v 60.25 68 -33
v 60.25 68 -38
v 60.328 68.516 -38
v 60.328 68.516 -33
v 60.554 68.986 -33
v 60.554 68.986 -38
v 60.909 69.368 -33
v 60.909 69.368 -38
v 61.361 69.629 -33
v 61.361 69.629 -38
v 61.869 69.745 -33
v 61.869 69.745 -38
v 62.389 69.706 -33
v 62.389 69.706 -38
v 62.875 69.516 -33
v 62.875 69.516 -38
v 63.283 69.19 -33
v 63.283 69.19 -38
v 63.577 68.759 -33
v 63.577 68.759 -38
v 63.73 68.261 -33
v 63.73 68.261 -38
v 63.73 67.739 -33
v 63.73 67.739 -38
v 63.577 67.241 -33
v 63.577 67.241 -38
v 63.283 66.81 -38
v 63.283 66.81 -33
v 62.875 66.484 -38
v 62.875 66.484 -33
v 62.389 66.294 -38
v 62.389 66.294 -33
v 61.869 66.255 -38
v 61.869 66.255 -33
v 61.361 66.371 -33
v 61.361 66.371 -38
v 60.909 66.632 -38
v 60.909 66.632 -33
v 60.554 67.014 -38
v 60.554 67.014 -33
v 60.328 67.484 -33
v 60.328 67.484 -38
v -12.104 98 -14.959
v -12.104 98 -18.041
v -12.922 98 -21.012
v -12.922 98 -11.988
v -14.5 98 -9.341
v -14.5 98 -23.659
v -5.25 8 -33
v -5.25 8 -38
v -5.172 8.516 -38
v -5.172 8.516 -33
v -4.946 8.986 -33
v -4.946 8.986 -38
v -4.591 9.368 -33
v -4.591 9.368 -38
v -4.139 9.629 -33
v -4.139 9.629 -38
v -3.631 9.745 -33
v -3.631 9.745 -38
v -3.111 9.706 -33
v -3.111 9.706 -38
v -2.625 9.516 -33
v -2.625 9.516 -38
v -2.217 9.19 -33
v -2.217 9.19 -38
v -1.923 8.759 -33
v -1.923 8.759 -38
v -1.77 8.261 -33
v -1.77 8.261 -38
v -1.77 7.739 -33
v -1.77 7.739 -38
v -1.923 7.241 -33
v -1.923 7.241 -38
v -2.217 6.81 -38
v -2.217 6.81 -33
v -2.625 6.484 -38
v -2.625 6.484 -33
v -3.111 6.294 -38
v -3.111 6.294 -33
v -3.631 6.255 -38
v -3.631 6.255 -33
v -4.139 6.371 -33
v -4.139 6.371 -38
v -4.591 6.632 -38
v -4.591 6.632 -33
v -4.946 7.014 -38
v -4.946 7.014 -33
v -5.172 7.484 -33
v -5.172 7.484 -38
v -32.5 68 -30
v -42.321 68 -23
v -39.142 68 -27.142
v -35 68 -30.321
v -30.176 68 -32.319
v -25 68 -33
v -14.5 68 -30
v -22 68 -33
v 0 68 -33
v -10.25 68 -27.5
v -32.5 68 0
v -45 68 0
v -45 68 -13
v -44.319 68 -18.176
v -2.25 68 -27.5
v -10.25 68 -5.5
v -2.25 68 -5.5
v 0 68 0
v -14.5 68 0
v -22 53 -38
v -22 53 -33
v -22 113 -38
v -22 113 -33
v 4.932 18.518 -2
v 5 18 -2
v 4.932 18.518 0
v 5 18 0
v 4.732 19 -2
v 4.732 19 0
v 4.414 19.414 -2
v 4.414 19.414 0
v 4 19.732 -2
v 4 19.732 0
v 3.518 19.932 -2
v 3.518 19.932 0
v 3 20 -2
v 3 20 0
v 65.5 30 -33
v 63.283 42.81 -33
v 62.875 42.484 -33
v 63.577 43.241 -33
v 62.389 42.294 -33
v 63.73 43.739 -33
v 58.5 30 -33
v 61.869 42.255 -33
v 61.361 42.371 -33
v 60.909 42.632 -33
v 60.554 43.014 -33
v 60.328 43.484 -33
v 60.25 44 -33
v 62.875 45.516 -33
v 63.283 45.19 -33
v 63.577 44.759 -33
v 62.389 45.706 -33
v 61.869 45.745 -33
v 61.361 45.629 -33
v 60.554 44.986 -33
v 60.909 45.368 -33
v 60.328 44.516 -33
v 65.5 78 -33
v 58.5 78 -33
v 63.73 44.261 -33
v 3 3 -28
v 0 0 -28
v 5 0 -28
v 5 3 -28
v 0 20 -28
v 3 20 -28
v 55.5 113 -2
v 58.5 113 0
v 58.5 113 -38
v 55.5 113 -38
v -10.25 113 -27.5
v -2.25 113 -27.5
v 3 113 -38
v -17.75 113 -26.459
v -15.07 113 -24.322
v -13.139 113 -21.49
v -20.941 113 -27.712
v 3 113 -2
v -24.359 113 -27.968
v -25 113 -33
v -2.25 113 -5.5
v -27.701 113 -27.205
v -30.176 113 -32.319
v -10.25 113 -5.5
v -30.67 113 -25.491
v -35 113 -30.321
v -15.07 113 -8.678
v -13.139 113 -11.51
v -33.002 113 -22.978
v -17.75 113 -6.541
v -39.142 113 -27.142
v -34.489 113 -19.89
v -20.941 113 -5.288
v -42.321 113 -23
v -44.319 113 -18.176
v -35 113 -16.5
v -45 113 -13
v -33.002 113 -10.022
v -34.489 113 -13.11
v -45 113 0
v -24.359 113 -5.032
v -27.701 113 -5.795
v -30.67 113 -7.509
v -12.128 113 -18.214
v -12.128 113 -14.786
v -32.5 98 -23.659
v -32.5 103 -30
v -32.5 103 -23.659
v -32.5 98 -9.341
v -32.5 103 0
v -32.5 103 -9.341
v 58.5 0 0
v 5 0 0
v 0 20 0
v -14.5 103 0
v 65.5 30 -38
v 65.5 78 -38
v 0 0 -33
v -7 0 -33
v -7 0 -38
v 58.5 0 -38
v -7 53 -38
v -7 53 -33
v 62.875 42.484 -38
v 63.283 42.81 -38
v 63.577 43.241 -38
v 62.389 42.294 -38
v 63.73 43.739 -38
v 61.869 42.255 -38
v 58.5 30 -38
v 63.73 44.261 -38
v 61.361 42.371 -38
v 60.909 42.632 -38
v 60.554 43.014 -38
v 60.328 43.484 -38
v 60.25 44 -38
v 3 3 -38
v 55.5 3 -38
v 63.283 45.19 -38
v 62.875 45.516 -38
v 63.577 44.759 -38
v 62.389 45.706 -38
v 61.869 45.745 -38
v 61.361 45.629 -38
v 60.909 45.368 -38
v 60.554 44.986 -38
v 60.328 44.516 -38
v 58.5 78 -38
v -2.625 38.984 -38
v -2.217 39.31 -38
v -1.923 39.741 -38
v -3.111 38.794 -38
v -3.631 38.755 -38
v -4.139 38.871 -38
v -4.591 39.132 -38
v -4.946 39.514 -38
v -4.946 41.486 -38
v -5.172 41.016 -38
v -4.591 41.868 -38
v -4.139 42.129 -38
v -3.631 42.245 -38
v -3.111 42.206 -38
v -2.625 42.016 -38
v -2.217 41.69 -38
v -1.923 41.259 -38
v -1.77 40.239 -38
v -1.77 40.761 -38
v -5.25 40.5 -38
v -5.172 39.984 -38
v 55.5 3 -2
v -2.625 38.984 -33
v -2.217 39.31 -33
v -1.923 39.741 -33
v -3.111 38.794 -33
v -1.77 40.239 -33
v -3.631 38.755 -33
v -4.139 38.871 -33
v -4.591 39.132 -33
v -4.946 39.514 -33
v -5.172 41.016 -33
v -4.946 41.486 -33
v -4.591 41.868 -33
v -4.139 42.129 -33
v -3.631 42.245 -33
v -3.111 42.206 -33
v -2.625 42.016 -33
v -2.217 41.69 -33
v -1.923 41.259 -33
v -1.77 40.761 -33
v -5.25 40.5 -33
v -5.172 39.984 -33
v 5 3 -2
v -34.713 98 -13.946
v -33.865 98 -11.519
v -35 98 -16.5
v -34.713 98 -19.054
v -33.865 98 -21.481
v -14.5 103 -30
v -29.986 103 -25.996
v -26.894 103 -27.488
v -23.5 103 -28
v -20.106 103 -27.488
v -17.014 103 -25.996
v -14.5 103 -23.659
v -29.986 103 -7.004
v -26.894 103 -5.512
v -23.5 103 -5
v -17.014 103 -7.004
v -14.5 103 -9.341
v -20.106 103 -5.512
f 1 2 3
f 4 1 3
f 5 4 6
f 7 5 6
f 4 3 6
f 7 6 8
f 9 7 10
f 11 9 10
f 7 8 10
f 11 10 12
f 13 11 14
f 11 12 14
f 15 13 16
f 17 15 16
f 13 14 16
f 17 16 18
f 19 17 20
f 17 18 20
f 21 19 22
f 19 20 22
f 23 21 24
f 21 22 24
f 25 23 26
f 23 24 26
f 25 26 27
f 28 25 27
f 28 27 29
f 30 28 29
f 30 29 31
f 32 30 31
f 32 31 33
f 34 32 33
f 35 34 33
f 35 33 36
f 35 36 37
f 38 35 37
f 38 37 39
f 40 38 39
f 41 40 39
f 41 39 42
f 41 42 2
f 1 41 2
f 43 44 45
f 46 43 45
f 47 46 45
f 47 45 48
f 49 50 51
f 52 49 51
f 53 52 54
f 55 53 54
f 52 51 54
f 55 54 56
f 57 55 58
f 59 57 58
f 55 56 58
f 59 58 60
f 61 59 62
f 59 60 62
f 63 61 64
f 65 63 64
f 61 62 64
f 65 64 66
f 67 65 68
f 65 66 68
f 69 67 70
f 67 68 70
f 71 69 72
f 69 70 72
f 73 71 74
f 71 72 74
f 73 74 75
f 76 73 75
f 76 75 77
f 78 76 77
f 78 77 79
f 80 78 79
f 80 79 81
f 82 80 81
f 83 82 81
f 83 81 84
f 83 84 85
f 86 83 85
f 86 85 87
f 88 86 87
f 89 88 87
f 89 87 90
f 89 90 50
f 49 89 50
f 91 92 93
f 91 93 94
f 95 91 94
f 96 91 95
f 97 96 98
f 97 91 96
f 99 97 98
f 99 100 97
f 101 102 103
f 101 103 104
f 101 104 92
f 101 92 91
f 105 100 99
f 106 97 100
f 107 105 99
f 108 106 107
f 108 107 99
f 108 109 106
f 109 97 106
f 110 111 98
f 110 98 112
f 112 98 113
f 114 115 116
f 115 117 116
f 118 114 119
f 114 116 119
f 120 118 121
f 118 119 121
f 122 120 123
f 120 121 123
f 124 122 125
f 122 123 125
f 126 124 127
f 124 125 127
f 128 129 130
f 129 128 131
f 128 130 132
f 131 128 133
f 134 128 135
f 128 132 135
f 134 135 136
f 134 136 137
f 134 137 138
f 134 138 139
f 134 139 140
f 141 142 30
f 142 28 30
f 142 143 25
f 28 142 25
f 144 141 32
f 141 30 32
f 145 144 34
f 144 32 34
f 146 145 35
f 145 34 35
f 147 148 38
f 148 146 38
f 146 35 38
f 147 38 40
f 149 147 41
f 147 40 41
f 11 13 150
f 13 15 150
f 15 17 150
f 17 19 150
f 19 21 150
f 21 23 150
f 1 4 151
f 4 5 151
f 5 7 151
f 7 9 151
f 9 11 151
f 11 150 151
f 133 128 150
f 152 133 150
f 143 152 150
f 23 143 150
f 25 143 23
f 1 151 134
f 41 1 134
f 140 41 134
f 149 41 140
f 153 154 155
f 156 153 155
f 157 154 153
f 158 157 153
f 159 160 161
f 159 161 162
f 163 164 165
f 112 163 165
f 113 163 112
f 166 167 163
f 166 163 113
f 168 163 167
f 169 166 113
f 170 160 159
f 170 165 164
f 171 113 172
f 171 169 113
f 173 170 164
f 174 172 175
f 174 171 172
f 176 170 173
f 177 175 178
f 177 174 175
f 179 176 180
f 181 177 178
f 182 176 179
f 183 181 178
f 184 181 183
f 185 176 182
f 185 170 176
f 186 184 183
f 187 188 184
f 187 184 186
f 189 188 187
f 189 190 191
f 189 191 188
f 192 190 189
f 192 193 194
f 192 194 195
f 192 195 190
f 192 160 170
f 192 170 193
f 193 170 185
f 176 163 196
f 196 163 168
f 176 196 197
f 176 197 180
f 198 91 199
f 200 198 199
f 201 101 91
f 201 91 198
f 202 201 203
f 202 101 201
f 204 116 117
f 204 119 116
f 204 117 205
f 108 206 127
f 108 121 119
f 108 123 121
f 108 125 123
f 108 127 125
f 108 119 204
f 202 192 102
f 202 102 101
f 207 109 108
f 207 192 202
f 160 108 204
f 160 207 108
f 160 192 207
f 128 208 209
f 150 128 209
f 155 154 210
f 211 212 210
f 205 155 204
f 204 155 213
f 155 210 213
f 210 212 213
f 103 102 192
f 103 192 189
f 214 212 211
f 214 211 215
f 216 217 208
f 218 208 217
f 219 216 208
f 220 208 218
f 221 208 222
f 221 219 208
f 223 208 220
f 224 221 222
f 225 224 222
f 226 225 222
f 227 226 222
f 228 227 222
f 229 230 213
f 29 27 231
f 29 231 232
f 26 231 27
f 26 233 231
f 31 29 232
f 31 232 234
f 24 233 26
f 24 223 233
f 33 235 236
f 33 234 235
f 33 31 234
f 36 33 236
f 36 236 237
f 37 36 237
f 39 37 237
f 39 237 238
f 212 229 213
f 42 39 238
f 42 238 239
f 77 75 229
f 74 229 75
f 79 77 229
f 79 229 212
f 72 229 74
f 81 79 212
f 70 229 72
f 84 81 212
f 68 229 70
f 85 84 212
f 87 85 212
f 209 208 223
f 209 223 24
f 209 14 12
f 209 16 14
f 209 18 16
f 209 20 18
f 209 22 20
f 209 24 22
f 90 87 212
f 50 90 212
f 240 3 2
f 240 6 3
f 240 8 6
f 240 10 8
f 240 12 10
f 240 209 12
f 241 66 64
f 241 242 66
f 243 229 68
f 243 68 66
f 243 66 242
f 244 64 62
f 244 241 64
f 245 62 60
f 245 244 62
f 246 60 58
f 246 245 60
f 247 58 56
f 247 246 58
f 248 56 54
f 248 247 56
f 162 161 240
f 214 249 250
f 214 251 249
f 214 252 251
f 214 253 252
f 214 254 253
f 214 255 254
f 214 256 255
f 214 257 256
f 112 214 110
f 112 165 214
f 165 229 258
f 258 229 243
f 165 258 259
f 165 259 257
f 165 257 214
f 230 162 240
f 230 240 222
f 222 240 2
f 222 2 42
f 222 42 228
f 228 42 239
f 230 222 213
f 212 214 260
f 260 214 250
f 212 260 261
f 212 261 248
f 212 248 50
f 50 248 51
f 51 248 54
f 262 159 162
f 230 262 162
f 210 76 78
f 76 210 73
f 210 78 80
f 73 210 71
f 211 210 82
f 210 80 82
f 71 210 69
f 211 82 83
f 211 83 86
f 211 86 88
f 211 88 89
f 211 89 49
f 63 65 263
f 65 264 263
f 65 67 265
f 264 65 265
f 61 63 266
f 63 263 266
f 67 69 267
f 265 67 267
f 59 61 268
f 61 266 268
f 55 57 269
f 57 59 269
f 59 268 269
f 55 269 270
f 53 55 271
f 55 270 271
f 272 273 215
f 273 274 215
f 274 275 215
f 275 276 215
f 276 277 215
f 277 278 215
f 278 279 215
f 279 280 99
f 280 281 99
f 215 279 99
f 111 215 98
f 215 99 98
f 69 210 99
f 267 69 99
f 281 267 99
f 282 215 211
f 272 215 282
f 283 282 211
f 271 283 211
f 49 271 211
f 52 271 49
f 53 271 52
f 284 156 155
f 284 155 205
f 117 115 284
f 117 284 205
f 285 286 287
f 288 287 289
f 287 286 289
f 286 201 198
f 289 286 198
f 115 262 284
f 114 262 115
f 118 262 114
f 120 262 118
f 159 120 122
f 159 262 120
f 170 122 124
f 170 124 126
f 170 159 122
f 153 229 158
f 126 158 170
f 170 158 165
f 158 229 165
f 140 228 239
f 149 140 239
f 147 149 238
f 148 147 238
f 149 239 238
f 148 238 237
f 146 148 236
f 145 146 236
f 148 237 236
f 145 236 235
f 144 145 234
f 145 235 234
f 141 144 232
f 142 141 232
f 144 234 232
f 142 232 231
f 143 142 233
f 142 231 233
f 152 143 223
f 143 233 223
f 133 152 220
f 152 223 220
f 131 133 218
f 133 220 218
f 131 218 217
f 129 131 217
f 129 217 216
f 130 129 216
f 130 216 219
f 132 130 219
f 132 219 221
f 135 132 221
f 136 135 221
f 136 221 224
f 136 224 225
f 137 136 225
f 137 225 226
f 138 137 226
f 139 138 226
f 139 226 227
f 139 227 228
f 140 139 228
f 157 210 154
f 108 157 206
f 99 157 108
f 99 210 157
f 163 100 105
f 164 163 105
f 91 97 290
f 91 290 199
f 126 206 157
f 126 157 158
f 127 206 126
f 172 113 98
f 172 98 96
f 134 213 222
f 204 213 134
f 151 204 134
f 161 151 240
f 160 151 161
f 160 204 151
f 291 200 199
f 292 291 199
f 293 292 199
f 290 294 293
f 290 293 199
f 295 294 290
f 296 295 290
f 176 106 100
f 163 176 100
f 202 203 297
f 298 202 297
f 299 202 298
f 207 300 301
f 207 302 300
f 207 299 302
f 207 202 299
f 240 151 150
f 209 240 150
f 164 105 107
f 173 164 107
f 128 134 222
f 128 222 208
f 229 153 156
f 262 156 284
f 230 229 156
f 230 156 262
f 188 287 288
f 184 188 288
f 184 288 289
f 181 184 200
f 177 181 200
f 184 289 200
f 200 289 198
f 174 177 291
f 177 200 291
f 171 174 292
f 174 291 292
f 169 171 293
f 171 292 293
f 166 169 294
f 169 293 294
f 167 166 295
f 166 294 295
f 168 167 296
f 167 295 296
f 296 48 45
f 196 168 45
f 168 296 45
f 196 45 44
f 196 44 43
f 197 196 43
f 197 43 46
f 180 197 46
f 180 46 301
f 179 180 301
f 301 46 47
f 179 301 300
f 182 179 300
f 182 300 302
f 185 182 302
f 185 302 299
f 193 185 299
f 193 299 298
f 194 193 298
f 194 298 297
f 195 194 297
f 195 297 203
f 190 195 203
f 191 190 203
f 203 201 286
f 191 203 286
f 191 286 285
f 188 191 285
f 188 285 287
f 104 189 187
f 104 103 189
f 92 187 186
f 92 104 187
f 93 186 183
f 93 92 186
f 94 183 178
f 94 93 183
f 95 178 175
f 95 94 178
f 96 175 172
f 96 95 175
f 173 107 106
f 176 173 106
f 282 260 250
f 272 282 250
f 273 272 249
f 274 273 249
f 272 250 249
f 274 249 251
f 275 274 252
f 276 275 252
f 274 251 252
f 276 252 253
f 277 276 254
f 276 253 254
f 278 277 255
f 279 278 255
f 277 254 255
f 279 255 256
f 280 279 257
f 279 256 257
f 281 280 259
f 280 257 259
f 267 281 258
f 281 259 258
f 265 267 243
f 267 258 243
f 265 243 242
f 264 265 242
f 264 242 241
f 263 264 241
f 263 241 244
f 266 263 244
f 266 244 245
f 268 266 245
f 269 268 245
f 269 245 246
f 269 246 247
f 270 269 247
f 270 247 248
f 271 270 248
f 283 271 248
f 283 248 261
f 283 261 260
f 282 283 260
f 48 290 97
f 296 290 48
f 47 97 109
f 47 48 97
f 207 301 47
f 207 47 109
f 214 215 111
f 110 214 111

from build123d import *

# Parameters (mm, degrees)
SKETCH_1_W          = 58.5
SKETCH_1_H          = 42
EXTRUDE_1_DEPTH     = 123
CUT_EXTRUDE_1_DEPTH = 120
SKETCH_3_W          = 58.5
SKETCH_3_H          = 123
CUT_EXTRUDE_2_DEPTH = 4
SKETCH_4_W          = 52.5
SKETCH_4_H          = 120
CUT_EXTRUDE_3_DEPTH = 1
SKETCH_5_W          = 58.5
SKETCH_5_H          = 38
CUT_EXTRUDE_4_DEPTH = 10
SKETCH_6_W          = 7
SKETCH_6_H          = 113
EXTRUDE_2_DEPTH     = 5
SKETCH_10_W         = 3
SKETCH_10_H         = 20
CUT_EXTRUDE_5_DEPTH = 33
HOLE_WIZARD_2_D     = 3.5
SKETCH_13_W         = 7
SKETCH_13_H         = 113
EXTRUDE_3_DEPTH     = 5
HOLE_WIZARD_3_D     = 3.5
SKETCH_17_W         = 7
SKETCH_17_H         = 35
SKETCH_17_H_2       = 30
CUT_EXTRUDE_6_DEPTH = 5
SKETCH_18_W         = 3
SKETCH_18_H         = 20
EXTRUDE_4_DEPTH     = 5
SKETCH_19_W         = 28
SKETCH_19_H         = 20
CUT_EXTRUDE_7_DEPTH = 2
FILLET_3_R          = 2
SKETCH_21_W         = 33
SKETCH_21_H         = 30
EXTRUDE_6_DEPTH     = 30
SKETCH_22_W         = 15
SKETCH_22_H         = 33
EXTRUDE_7_DEPTH     = 30
SKETCH_24_W         = 18
SKETCH_24_H         = 20
CUT_EXTRUDE_8_DEPTH = 30
HOLE_WIZARD_4_D     = 23
HOLE_WIZARD_4_DEPTH = 15
SKETCH_27_W         = 15
SKETCH_27_H         = 60
EXTRUDE_8_DEPTH     = 5
SKETCH_28_W         = 45
SKETCH_28_H         = 3
EXTRUDE_9_DEPTH     = 15
SKETCH_29_W         = 14.5
SKETCH_29_H         = 30
SKETCH_29_W_2       = 12.5
EXTRUDE_10_DEPTH    = 15
FILLET_6_R          = 20
SKETCH_30_W         = 2
SKETCH_30_H         = 22
CUT_EXTRUDE_9_DEPTH = 102.775488208


with BuildPart() as part:
    # 草图1 → 凸台-拉伸1 (new body)
    with BuildSketch(Plane(origin=(0, 0, 0), x_dir=(1, 0, 0), z_dir=(0, 1, 0))):
        with Locations((29.25, 21)):
            Rectangle(SKETCH_1_W, SKETCH_1_H)
    extrude(amount=EXTRUDE_1_DEPTH)

    # 草图2 → 切除-拉伸1 (cut)
    with BuildSketch(Plane(origin=(0, 123, 0), x_dir=(1, 0, 0), z_dir=(0, 1, 0))):
        Polygon((3, 3), (4.178571429, 3), (54.321428571, 39), (3, 39), align=None)
        Polygon((54.321428571, 39), (4.178571429, 3), (55.5, 3), (55.5, 39), align=None)
    extrude(amount=-CUT_EXTRUDE_1_DEPTH, mode=Mode.SUBTRACT)

    # 草图3 → 切除-拉伸2 (cut)
    with BuildSketch(Plane(origin=(0, 0, -42), x_dir=(-1, 0, 0), z_dir=(0, 0, -1))):
        with Locations((-29.25, 61.5)):
            Rectangle(SKETCH_3_W, SKETCH_3_H)
    extrude(amount=-CUT_EXTRUDE_2_DEPTH, mode=Mode.SUBTRACT)

    # 草图4 → 切除-拉伸3 (cut)
    with BuildSketch(Plane(origin=(0, 0, -3), x_dir=(-1, 0, 0), z_dir=(0, 0, -1))):
        with Locations((-29.25, 63)):
            Rectangle(SKETCH_4_W, SKETCH_4_H)
    extrude(amount=-CUT_EXTRUDE_3_DEPTH, mode=Mode.SUBTRACT)

    # 草图5 → 切除-拉伸4 (cut)
    with BuildSketch(Plane(origin=(0, 123, 0), x_dir=(1, 0, 0), z_dir=(0, 1, 0))):
        with Locations((29.25, 19)):
            Rectangle(SKETCH_5_W, SKETCH_5_H)
    extrude(amount=-CUT_EXTRUDE_4_DEPTH, mode=Mode.SUBTRACT)

    # 草图6 → 凸台-拉伸2 (add)
    with BuildSketch(Plane(origin=(0, 0, -38), x_dir=(-1, 0, 0), z_dir=(0, 0, -1))):
        with Locations((3.5, 56.5)):
            Rectangle(SKETCH_6_W, SKETCH_6_H)
    extrude(amount=-EXTRUDE_2_DEPTH)

    # 草图10 → 切除-拉伸5 (cut)
    with BuildSketch(Plane.XY):
        with Locations((1.5, 10)):
            Rectangle(SKETCH_10_W, SKETCH_10_H)
    extrude(amount=-CUT_EXTRUDE_5_DEPTH, mode=Mode.SUBTRACT)

    # 孔2 (through all)
    with Locations(Plane.XY.offset(-33)):
        with Locations((-3.5, 40.5), (-3.5, 8)):
            Hole(HOLE_WIZARD_2_D / 2)

    # 草图13 → 凸台-拉伸3 (add)
    with BuildSketch(Plane(origin=(0, 0, -38), x_dir=(-1, 0, 0), z_dir=(0, 0, -1))):
        with Locations((-62, 56.5)):
            Rectangle(SKETCH_13_W, SKETCH_13_H)
    extrude(amount=-EXTRUDE_3_DEPTH)

    # 孔3 (through all)
    with Locations(Plane.XY.offset(-33)):
        with Locations((62, 68), (62, 44)):
            Hole(HOLE_WIZARD_3_D / 2)

    # 草图17 → 切除-拉伸6 (cut)
    with BuildSketch(Plane.XY.offset(-33)):
        with Locations((62, 95.5)):
            Rectangle(SKETCH_17_W, SKETCH_17_H)
        with Locations((62, 15)):
            Rectangle(SKETCH_17_W, SKETCH_17_H_2)
    extrude(amount=-CUT_EXTRUDE_6_DEPTH, mode=Mode.SUBTRACT)

    # 草图18 → 凸台-拉伸4 (add)
    with BuildSketch(Plane.XY.offset(-33)):
        with Locations((1.5, 10)):
            Rectangle(SKETCH_18_W, SKETCH_18_H)
    extrude(amount=EXTRUDE_4_DEPTH)

    # 草图19 → 切除-拉伸7 (cut)
    with BuildSketch(Plane.ZY.offset(-3)):
        with Locations((-14, 10)):
            Rectangle(SKETCH_19_W, SKETCH_19_H)
    extrude(amount=-CUT_EXTRUDE_7_DEPTH, mode=Mode.SUBTRACT)

    # 圆角3
    fillet_3_edges = [part.edges().sort_by_distance(p)[0] for p in [
        (5, 20, -1),
    ]]
    fillet(fillet_3_edges, radius=FILLET_3_R)

    # 草图21 → 凸台-拉伸6 (add)
    with BuildSketch(Plane.ZY):
        with Locations((-16.5, 98)):
            Rectangle(SKETCH_21_W, SKETCH_21_H)
    extrude(amount=EXTRUDE_6_DEPTH)

    # 草图22 → 凸台-拉伸7 (add)
    with BuildSketch(Plane(origin=(0, 113, 0), x_dir=(1, 0, 0), z_dir=(0, 1, 0))):
        with Locations((-37.5, 16.5)):
            Rectangle(SKETCH_22_W, SKETCH_22_H)
    extrude(amount=-EXTRUDE_7_DEPTH)

    # 草图24 → 切除-拉伸8 (cut)
    with BuildSketch(Plane.XY):
        with Locations((-23.5, 93)):
            Rectangle(SKETCH_24_W, SKETCH_24_H)
    extrude(amount=-CUT_EXTRUDE_8_DEPTH, mode=Mode.SUBTRACT)

    # 孔4
    with Locations(Plane(origin=(0, 113, 0), x_dir=(1, 0, 0), z_dir=(0, 1, 0))):
        with Locations((-23.5, 16.5)):
            Hole(HOLE_WIZARD_4_D / 2, depth=HOLE_WIZARD_4_DEPTH)

    # 草图27 → 凸台-拉伸8 (add)
    with BuildSketch(Plane(origin=(0, 0, -33), x_dir=(-1, 0, 0), z_dir=(0, 0, -1))):
        with Locations((14.5, 83)):
            Rectangle(SKETCH_27_W, SKETCH_27_H)
    extrude(amount=EXTRUDE_8_DEPTH)

    # 草图28 → 凸台-拉伸9 (add)
    with BuildSketch(Plane(origin=(0, 83, 0), x_dir=(-1, 0, 0), z_dir=(0, -1, 0))):
        with Locations((22.5, 31.5)):
            Rectangle(SKETCH_28_W, SKETCH_28_H)
    extrude(amount=EXTRUDE_9_DEPTH)

    # 草图29 → 凸台-拉伸10 (add)
    with BuildSketch(Plane.XZ.offset(-83)):
        with Locations((-7.25, -15)):
            Rectangle(SKETCH_29_W, SKETCH_29_H)
        with Locations((-38.75, -15)):
            Rectangle(SKETCH_29_W_2, SKETCH_29_H)
    extrude(amount=EXTRUDE_10_DEPTH)

    # 圆角6
    fillet_6_edges = [part.edges().sort_by_distance(p)[0] for p in [
        (-45, 90.5, -33),
    ]]
    fillet(fillet_6_edges, radius=FILLET_6_R)

    # 草图30 → 切除-拉伸9 (cut, through all)
    with BuildSketch(Plane.XZ.offset(-68)):
        Polygon((-10.25, -9.672413793), (-4.25, -23.327586207), (-4.25, -5.5), (-10.25, -5.5), align=None)
        Polygon((-4.25, -27.5), (-4.25, -23.327586207), (-10.25, -9.672413793), (-10.25, -27.5), align=None)
        with Locations((-3.25, -16.5)):
            Rectangle(SKETCH_30_W, SKETCH_30_H)
    extrude(amount=-CUT_EXTRUDE_9_DEPTH, mode=Mode.SUBTRACT)


solid = part.part
